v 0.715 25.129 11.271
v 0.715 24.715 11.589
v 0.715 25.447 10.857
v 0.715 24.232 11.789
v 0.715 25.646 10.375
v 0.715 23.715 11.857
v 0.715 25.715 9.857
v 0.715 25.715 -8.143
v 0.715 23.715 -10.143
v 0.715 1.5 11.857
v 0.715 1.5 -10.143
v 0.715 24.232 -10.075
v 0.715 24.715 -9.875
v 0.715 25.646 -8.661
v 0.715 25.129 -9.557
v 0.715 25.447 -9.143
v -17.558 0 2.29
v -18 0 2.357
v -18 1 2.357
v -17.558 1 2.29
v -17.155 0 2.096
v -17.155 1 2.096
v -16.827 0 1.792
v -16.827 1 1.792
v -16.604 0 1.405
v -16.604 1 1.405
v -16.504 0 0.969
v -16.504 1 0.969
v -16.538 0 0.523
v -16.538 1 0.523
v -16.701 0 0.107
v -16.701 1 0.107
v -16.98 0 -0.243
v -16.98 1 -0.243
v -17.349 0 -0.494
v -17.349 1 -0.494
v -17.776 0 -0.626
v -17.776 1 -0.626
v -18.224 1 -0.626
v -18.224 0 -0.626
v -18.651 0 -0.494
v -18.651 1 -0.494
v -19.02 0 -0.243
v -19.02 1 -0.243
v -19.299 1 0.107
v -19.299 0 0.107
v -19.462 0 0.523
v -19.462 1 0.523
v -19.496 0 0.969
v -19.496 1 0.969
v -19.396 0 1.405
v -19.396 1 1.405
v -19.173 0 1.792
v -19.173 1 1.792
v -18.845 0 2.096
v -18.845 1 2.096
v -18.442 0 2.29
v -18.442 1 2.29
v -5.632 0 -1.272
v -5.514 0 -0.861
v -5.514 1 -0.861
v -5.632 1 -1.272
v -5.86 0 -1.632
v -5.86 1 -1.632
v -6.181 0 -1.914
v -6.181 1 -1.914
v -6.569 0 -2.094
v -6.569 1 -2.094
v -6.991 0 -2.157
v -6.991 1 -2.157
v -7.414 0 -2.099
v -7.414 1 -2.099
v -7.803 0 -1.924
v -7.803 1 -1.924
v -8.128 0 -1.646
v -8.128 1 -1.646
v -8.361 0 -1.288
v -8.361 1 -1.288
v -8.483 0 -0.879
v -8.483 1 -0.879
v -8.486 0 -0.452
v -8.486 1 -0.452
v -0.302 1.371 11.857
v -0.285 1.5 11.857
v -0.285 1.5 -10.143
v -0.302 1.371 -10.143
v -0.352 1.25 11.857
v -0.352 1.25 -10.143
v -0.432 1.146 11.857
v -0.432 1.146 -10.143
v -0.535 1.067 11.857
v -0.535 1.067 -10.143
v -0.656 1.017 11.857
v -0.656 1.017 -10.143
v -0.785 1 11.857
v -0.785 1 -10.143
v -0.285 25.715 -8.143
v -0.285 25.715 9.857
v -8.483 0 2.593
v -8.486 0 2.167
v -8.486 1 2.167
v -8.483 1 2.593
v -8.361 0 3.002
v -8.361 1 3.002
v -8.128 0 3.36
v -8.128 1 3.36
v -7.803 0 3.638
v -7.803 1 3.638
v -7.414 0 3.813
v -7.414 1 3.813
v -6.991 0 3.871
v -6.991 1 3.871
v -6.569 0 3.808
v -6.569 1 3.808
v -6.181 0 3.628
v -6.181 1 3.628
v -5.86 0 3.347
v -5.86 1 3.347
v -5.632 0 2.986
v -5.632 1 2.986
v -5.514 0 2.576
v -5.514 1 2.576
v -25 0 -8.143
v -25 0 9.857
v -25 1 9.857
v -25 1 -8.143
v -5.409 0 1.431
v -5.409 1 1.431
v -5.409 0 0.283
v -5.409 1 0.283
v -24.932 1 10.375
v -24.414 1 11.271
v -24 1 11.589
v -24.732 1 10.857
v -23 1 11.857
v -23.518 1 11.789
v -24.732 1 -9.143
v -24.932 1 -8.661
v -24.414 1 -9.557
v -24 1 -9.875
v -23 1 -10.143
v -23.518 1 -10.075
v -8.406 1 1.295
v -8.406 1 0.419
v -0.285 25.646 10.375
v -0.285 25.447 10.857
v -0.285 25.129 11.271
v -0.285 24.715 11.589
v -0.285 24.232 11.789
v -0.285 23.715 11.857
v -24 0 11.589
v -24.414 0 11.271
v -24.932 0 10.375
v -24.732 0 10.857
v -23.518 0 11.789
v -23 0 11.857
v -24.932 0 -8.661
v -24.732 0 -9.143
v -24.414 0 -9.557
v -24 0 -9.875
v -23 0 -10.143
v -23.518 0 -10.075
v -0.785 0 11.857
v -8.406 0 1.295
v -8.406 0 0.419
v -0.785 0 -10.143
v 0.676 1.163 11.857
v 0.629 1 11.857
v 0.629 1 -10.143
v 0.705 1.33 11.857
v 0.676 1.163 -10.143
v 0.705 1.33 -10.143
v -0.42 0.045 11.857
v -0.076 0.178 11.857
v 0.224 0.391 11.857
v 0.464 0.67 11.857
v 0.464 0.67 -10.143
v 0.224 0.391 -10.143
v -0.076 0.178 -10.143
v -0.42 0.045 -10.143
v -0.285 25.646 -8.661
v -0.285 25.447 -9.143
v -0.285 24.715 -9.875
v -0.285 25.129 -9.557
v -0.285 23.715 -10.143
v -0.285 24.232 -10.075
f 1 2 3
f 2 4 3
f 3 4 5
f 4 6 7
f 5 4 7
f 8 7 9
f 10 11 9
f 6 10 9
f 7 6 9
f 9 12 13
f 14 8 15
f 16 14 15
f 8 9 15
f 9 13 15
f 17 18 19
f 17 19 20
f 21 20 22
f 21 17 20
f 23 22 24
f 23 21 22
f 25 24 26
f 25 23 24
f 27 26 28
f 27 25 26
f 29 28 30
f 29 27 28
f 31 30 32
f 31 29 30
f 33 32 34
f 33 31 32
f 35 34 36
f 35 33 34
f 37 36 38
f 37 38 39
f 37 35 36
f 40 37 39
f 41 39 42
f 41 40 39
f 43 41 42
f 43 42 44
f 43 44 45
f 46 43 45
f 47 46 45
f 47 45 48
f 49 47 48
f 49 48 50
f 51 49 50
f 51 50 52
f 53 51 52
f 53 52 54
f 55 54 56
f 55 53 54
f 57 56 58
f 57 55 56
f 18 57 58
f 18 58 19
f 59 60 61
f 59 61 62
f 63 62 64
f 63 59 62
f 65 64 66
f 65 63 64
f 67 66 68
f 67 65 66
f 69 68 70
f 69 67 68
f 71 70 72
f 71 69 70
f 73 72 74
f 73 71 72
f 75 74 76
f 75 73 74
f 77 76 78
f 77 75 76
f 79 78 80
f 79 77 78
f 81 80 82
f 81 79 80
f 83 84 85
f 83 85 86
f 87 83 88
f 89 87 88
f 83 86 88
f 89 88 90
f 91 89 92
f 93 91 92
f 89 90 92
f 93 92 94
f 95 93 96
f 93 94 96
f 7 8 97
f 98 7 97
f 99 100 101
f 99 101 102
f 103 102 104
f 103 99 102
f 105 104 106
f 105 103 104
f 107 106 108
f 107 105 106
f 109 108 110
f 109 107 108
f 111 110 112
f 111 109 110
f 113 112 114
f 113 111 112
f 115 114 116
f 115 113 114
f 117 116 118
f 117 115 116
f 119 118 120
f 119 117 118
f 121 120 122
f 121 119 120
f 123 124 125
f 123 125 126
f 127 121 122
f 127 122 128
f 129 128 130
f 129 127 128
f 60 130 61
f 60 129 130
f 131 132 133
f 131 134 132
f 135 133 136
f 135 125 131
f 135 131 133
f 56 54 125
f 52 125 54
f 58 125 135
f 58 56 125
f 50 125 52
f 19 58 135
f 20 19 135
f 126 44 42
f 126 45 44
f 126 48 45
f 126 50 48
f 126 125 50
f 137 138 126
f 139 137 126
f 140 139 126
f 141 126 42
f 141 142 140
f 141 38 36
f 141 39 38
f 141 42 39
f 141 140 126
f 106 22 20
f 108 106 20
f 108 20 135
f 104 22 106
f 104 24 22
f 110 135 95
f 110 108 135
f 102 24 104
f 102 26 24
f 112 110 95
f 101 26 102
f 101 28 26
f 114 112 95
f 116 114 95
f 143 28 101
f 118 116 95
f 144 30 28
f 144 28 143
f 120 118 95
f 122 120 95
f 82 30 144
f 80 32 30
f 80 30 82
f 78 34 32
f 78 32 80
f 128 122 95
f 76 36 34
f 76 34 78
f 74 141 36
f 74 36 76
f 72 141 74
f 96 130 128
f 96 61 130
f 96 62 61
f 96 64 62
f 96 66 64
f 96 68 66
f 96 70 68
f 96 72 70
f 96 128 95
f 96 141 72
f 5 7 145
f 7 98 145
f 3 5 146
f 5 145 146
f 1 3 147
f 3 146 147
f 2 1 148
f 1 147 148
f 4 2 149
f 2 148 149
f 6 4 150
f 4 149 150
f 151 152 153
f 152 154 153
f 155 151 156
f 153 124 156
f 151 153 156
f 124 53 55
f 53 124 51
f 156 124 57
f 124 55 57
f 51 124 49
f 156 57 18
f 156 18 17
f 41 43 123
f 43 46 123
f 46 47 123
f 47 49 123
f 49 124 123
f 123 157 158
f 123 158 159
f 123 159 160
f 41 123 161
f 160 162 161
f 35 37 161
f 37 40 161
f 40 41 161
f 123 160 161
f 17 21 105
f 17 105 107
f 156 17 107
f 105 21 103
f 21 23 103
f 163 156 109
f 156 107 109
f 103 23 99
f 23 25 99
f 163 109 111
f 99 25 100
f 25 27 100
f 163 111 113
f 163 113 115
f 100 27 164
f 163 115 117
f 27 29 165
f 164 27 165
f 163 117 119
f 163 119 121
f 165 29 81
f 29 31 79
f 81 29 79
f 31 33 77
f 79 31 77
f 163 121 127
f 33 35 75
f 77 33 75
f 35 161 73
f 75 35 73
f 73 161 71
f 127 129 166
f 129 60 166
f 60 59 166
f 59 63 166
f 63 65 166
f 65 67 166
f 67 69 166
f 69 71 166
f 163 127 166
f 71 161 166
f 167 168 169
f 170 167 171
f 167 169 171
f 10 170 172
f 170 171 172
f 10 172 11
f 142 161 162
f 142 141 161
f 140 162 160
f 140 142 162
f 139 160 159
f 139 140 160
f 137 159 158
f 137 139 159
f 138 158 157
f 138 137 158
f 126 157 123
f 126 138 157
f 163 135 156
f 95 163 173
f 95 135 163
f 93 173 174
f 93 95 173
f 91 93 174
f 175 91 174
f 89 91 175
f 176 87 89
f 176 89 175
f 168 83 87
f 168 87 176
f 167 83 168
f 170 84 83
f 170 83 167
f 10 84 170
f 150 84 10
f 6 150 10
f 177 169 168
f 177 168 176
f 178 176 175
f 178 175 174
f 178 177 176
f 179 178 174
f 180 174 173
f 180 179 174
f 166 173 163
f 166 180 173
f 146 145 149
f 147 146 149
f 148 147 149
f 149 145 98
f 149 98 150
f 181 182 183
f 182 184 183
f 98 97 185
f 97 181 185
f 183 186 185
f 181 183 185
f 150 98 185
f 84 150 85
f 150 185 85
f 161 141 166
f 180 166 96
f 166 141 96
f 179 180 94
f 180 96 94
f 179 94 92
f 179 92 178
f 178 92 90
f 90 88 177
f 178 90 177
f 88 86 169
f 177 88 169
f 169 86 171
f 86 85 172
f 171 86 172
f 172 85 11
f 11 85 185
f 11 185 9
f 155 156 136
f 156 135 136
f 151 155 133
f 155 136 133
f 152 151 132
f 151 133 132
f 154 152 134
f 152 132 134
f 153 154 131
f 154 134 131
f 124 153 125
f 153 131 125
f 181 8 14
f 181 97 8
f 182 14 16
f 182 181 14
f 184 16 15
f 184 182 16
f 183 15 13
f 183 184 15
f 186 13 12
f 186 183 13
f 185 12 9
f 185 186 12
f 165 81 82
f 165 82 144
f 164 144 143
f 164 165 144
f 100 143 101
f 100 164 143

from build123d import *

# Parameters (mm, degrees)
SKETCH_1_W      = 50
SKETCH_1_H      = 22
SKETCH_1_R      = 1.5
EXTRUDE_1_DEPTH = 1
OTHER_START     = -10.142952565
OTHER_1_DEPTH   = 22
OTHER_1_2_DEPTH = 22
FILLET_1_R      = 2


# Read off the part's stored shape, not the designer's step: Нарисованный сгиб1
with BuildPart() as part:
    # Sketch 1 → Бобышка-Вытянуть1 (new body)
    with BuildSketch(Plane(origin=(0, 0, 0), x_dir=(1, 0, 0), z_dir=(0, 1, 0))):
        with Locations((0, -0.857047435)):
            Rectangle(SKETCH_1_W, SKETCH_1_H)
        with Locations(Location((-18, -0.857047435, 0), (0, 0, 270))):
            Circle(SKETCH_1_R, mode=Mode.SUBTRACT)
        with BuildLine():
            ThreePointArc((-5.514009268, -2.575584316), (-5.396296831, -0.857047435), (-5.514009268, 0.861489446))
            ThreePointArc((-5.514009268, 0.861489446), (-7.204527613, 2.142952565), (-8.485990732, 0.45243422))
            ThreePointArc((-8.485990732, 0.45243422), (-8.396296831, -0.857047435), (-8.485990732, -2.16652909))
            ThreePointArc((-8.485990732, -2.16652909), (-7.204527613, -3.857047435), (-5.514009268, -2.575584316))
        make_face(mode=Mode.SUBTRACT)
    extrude(amount=EXTRUDE_1_DEPTH)

    # Other 1 outline → Other 1 (cut)
    with BuildSketch(Plane.XY.offset(OTHER_START)):
        with BuildLine():
            Line((25, 1), (0.628815399, 1))
            ThreePointArc((0.628815399, 1), (0.08062724, 0.275255129), (-0.785398163, 0))
            Line((-0.785398163, 0), (25, 0))
            Line((25, 0), (25, 1))
        make_face()
    extrude(amount=OTHER_1_DEPTH, mode=Mode.SUBTRACT)

    # Other 1 2 outline → Other 1 2 (add)
    with BuildSketch(Plane.XY.offset(OTHER_START)):
        with BuildLine():
            Line((0.714601837, 1.5), (0.714601837, 25.714601837))
            Line((0.714601837, 25.714601837), (-0.285398163, 25.714601837))
            Line((-0.285398163, 25.714601837), (-0.285398163, 1.5))
            ThreePointArc((-0.285398163, 1.5), (-0.431844772, 1.146446609), (-0.785398163, 1))
            Line((-0.785398163, 1), (0.628815399, 1))
            ThreePointArc((0.628815399, 1), (0.692999676, 1.246347032), (0.714601837, 1.5))
        make_face()
    extrude(amount=OTHER_1_2_DEPTH)

    # Скругление1
    fillet_1_edges = [part.edges().sort_by_distance(p)[0] for p in [
        (0.214601837, 25.714601837, -10.142952565),
        (0.214601837, 25.714601837, 11.857047435),
        (-25, 0.5, 11.857047435),
        (-25, 0.5, -10.142952565),
    ]]
    fillet(fillet_1_edges, radius=FILLET_1_R)


solid = part.part
